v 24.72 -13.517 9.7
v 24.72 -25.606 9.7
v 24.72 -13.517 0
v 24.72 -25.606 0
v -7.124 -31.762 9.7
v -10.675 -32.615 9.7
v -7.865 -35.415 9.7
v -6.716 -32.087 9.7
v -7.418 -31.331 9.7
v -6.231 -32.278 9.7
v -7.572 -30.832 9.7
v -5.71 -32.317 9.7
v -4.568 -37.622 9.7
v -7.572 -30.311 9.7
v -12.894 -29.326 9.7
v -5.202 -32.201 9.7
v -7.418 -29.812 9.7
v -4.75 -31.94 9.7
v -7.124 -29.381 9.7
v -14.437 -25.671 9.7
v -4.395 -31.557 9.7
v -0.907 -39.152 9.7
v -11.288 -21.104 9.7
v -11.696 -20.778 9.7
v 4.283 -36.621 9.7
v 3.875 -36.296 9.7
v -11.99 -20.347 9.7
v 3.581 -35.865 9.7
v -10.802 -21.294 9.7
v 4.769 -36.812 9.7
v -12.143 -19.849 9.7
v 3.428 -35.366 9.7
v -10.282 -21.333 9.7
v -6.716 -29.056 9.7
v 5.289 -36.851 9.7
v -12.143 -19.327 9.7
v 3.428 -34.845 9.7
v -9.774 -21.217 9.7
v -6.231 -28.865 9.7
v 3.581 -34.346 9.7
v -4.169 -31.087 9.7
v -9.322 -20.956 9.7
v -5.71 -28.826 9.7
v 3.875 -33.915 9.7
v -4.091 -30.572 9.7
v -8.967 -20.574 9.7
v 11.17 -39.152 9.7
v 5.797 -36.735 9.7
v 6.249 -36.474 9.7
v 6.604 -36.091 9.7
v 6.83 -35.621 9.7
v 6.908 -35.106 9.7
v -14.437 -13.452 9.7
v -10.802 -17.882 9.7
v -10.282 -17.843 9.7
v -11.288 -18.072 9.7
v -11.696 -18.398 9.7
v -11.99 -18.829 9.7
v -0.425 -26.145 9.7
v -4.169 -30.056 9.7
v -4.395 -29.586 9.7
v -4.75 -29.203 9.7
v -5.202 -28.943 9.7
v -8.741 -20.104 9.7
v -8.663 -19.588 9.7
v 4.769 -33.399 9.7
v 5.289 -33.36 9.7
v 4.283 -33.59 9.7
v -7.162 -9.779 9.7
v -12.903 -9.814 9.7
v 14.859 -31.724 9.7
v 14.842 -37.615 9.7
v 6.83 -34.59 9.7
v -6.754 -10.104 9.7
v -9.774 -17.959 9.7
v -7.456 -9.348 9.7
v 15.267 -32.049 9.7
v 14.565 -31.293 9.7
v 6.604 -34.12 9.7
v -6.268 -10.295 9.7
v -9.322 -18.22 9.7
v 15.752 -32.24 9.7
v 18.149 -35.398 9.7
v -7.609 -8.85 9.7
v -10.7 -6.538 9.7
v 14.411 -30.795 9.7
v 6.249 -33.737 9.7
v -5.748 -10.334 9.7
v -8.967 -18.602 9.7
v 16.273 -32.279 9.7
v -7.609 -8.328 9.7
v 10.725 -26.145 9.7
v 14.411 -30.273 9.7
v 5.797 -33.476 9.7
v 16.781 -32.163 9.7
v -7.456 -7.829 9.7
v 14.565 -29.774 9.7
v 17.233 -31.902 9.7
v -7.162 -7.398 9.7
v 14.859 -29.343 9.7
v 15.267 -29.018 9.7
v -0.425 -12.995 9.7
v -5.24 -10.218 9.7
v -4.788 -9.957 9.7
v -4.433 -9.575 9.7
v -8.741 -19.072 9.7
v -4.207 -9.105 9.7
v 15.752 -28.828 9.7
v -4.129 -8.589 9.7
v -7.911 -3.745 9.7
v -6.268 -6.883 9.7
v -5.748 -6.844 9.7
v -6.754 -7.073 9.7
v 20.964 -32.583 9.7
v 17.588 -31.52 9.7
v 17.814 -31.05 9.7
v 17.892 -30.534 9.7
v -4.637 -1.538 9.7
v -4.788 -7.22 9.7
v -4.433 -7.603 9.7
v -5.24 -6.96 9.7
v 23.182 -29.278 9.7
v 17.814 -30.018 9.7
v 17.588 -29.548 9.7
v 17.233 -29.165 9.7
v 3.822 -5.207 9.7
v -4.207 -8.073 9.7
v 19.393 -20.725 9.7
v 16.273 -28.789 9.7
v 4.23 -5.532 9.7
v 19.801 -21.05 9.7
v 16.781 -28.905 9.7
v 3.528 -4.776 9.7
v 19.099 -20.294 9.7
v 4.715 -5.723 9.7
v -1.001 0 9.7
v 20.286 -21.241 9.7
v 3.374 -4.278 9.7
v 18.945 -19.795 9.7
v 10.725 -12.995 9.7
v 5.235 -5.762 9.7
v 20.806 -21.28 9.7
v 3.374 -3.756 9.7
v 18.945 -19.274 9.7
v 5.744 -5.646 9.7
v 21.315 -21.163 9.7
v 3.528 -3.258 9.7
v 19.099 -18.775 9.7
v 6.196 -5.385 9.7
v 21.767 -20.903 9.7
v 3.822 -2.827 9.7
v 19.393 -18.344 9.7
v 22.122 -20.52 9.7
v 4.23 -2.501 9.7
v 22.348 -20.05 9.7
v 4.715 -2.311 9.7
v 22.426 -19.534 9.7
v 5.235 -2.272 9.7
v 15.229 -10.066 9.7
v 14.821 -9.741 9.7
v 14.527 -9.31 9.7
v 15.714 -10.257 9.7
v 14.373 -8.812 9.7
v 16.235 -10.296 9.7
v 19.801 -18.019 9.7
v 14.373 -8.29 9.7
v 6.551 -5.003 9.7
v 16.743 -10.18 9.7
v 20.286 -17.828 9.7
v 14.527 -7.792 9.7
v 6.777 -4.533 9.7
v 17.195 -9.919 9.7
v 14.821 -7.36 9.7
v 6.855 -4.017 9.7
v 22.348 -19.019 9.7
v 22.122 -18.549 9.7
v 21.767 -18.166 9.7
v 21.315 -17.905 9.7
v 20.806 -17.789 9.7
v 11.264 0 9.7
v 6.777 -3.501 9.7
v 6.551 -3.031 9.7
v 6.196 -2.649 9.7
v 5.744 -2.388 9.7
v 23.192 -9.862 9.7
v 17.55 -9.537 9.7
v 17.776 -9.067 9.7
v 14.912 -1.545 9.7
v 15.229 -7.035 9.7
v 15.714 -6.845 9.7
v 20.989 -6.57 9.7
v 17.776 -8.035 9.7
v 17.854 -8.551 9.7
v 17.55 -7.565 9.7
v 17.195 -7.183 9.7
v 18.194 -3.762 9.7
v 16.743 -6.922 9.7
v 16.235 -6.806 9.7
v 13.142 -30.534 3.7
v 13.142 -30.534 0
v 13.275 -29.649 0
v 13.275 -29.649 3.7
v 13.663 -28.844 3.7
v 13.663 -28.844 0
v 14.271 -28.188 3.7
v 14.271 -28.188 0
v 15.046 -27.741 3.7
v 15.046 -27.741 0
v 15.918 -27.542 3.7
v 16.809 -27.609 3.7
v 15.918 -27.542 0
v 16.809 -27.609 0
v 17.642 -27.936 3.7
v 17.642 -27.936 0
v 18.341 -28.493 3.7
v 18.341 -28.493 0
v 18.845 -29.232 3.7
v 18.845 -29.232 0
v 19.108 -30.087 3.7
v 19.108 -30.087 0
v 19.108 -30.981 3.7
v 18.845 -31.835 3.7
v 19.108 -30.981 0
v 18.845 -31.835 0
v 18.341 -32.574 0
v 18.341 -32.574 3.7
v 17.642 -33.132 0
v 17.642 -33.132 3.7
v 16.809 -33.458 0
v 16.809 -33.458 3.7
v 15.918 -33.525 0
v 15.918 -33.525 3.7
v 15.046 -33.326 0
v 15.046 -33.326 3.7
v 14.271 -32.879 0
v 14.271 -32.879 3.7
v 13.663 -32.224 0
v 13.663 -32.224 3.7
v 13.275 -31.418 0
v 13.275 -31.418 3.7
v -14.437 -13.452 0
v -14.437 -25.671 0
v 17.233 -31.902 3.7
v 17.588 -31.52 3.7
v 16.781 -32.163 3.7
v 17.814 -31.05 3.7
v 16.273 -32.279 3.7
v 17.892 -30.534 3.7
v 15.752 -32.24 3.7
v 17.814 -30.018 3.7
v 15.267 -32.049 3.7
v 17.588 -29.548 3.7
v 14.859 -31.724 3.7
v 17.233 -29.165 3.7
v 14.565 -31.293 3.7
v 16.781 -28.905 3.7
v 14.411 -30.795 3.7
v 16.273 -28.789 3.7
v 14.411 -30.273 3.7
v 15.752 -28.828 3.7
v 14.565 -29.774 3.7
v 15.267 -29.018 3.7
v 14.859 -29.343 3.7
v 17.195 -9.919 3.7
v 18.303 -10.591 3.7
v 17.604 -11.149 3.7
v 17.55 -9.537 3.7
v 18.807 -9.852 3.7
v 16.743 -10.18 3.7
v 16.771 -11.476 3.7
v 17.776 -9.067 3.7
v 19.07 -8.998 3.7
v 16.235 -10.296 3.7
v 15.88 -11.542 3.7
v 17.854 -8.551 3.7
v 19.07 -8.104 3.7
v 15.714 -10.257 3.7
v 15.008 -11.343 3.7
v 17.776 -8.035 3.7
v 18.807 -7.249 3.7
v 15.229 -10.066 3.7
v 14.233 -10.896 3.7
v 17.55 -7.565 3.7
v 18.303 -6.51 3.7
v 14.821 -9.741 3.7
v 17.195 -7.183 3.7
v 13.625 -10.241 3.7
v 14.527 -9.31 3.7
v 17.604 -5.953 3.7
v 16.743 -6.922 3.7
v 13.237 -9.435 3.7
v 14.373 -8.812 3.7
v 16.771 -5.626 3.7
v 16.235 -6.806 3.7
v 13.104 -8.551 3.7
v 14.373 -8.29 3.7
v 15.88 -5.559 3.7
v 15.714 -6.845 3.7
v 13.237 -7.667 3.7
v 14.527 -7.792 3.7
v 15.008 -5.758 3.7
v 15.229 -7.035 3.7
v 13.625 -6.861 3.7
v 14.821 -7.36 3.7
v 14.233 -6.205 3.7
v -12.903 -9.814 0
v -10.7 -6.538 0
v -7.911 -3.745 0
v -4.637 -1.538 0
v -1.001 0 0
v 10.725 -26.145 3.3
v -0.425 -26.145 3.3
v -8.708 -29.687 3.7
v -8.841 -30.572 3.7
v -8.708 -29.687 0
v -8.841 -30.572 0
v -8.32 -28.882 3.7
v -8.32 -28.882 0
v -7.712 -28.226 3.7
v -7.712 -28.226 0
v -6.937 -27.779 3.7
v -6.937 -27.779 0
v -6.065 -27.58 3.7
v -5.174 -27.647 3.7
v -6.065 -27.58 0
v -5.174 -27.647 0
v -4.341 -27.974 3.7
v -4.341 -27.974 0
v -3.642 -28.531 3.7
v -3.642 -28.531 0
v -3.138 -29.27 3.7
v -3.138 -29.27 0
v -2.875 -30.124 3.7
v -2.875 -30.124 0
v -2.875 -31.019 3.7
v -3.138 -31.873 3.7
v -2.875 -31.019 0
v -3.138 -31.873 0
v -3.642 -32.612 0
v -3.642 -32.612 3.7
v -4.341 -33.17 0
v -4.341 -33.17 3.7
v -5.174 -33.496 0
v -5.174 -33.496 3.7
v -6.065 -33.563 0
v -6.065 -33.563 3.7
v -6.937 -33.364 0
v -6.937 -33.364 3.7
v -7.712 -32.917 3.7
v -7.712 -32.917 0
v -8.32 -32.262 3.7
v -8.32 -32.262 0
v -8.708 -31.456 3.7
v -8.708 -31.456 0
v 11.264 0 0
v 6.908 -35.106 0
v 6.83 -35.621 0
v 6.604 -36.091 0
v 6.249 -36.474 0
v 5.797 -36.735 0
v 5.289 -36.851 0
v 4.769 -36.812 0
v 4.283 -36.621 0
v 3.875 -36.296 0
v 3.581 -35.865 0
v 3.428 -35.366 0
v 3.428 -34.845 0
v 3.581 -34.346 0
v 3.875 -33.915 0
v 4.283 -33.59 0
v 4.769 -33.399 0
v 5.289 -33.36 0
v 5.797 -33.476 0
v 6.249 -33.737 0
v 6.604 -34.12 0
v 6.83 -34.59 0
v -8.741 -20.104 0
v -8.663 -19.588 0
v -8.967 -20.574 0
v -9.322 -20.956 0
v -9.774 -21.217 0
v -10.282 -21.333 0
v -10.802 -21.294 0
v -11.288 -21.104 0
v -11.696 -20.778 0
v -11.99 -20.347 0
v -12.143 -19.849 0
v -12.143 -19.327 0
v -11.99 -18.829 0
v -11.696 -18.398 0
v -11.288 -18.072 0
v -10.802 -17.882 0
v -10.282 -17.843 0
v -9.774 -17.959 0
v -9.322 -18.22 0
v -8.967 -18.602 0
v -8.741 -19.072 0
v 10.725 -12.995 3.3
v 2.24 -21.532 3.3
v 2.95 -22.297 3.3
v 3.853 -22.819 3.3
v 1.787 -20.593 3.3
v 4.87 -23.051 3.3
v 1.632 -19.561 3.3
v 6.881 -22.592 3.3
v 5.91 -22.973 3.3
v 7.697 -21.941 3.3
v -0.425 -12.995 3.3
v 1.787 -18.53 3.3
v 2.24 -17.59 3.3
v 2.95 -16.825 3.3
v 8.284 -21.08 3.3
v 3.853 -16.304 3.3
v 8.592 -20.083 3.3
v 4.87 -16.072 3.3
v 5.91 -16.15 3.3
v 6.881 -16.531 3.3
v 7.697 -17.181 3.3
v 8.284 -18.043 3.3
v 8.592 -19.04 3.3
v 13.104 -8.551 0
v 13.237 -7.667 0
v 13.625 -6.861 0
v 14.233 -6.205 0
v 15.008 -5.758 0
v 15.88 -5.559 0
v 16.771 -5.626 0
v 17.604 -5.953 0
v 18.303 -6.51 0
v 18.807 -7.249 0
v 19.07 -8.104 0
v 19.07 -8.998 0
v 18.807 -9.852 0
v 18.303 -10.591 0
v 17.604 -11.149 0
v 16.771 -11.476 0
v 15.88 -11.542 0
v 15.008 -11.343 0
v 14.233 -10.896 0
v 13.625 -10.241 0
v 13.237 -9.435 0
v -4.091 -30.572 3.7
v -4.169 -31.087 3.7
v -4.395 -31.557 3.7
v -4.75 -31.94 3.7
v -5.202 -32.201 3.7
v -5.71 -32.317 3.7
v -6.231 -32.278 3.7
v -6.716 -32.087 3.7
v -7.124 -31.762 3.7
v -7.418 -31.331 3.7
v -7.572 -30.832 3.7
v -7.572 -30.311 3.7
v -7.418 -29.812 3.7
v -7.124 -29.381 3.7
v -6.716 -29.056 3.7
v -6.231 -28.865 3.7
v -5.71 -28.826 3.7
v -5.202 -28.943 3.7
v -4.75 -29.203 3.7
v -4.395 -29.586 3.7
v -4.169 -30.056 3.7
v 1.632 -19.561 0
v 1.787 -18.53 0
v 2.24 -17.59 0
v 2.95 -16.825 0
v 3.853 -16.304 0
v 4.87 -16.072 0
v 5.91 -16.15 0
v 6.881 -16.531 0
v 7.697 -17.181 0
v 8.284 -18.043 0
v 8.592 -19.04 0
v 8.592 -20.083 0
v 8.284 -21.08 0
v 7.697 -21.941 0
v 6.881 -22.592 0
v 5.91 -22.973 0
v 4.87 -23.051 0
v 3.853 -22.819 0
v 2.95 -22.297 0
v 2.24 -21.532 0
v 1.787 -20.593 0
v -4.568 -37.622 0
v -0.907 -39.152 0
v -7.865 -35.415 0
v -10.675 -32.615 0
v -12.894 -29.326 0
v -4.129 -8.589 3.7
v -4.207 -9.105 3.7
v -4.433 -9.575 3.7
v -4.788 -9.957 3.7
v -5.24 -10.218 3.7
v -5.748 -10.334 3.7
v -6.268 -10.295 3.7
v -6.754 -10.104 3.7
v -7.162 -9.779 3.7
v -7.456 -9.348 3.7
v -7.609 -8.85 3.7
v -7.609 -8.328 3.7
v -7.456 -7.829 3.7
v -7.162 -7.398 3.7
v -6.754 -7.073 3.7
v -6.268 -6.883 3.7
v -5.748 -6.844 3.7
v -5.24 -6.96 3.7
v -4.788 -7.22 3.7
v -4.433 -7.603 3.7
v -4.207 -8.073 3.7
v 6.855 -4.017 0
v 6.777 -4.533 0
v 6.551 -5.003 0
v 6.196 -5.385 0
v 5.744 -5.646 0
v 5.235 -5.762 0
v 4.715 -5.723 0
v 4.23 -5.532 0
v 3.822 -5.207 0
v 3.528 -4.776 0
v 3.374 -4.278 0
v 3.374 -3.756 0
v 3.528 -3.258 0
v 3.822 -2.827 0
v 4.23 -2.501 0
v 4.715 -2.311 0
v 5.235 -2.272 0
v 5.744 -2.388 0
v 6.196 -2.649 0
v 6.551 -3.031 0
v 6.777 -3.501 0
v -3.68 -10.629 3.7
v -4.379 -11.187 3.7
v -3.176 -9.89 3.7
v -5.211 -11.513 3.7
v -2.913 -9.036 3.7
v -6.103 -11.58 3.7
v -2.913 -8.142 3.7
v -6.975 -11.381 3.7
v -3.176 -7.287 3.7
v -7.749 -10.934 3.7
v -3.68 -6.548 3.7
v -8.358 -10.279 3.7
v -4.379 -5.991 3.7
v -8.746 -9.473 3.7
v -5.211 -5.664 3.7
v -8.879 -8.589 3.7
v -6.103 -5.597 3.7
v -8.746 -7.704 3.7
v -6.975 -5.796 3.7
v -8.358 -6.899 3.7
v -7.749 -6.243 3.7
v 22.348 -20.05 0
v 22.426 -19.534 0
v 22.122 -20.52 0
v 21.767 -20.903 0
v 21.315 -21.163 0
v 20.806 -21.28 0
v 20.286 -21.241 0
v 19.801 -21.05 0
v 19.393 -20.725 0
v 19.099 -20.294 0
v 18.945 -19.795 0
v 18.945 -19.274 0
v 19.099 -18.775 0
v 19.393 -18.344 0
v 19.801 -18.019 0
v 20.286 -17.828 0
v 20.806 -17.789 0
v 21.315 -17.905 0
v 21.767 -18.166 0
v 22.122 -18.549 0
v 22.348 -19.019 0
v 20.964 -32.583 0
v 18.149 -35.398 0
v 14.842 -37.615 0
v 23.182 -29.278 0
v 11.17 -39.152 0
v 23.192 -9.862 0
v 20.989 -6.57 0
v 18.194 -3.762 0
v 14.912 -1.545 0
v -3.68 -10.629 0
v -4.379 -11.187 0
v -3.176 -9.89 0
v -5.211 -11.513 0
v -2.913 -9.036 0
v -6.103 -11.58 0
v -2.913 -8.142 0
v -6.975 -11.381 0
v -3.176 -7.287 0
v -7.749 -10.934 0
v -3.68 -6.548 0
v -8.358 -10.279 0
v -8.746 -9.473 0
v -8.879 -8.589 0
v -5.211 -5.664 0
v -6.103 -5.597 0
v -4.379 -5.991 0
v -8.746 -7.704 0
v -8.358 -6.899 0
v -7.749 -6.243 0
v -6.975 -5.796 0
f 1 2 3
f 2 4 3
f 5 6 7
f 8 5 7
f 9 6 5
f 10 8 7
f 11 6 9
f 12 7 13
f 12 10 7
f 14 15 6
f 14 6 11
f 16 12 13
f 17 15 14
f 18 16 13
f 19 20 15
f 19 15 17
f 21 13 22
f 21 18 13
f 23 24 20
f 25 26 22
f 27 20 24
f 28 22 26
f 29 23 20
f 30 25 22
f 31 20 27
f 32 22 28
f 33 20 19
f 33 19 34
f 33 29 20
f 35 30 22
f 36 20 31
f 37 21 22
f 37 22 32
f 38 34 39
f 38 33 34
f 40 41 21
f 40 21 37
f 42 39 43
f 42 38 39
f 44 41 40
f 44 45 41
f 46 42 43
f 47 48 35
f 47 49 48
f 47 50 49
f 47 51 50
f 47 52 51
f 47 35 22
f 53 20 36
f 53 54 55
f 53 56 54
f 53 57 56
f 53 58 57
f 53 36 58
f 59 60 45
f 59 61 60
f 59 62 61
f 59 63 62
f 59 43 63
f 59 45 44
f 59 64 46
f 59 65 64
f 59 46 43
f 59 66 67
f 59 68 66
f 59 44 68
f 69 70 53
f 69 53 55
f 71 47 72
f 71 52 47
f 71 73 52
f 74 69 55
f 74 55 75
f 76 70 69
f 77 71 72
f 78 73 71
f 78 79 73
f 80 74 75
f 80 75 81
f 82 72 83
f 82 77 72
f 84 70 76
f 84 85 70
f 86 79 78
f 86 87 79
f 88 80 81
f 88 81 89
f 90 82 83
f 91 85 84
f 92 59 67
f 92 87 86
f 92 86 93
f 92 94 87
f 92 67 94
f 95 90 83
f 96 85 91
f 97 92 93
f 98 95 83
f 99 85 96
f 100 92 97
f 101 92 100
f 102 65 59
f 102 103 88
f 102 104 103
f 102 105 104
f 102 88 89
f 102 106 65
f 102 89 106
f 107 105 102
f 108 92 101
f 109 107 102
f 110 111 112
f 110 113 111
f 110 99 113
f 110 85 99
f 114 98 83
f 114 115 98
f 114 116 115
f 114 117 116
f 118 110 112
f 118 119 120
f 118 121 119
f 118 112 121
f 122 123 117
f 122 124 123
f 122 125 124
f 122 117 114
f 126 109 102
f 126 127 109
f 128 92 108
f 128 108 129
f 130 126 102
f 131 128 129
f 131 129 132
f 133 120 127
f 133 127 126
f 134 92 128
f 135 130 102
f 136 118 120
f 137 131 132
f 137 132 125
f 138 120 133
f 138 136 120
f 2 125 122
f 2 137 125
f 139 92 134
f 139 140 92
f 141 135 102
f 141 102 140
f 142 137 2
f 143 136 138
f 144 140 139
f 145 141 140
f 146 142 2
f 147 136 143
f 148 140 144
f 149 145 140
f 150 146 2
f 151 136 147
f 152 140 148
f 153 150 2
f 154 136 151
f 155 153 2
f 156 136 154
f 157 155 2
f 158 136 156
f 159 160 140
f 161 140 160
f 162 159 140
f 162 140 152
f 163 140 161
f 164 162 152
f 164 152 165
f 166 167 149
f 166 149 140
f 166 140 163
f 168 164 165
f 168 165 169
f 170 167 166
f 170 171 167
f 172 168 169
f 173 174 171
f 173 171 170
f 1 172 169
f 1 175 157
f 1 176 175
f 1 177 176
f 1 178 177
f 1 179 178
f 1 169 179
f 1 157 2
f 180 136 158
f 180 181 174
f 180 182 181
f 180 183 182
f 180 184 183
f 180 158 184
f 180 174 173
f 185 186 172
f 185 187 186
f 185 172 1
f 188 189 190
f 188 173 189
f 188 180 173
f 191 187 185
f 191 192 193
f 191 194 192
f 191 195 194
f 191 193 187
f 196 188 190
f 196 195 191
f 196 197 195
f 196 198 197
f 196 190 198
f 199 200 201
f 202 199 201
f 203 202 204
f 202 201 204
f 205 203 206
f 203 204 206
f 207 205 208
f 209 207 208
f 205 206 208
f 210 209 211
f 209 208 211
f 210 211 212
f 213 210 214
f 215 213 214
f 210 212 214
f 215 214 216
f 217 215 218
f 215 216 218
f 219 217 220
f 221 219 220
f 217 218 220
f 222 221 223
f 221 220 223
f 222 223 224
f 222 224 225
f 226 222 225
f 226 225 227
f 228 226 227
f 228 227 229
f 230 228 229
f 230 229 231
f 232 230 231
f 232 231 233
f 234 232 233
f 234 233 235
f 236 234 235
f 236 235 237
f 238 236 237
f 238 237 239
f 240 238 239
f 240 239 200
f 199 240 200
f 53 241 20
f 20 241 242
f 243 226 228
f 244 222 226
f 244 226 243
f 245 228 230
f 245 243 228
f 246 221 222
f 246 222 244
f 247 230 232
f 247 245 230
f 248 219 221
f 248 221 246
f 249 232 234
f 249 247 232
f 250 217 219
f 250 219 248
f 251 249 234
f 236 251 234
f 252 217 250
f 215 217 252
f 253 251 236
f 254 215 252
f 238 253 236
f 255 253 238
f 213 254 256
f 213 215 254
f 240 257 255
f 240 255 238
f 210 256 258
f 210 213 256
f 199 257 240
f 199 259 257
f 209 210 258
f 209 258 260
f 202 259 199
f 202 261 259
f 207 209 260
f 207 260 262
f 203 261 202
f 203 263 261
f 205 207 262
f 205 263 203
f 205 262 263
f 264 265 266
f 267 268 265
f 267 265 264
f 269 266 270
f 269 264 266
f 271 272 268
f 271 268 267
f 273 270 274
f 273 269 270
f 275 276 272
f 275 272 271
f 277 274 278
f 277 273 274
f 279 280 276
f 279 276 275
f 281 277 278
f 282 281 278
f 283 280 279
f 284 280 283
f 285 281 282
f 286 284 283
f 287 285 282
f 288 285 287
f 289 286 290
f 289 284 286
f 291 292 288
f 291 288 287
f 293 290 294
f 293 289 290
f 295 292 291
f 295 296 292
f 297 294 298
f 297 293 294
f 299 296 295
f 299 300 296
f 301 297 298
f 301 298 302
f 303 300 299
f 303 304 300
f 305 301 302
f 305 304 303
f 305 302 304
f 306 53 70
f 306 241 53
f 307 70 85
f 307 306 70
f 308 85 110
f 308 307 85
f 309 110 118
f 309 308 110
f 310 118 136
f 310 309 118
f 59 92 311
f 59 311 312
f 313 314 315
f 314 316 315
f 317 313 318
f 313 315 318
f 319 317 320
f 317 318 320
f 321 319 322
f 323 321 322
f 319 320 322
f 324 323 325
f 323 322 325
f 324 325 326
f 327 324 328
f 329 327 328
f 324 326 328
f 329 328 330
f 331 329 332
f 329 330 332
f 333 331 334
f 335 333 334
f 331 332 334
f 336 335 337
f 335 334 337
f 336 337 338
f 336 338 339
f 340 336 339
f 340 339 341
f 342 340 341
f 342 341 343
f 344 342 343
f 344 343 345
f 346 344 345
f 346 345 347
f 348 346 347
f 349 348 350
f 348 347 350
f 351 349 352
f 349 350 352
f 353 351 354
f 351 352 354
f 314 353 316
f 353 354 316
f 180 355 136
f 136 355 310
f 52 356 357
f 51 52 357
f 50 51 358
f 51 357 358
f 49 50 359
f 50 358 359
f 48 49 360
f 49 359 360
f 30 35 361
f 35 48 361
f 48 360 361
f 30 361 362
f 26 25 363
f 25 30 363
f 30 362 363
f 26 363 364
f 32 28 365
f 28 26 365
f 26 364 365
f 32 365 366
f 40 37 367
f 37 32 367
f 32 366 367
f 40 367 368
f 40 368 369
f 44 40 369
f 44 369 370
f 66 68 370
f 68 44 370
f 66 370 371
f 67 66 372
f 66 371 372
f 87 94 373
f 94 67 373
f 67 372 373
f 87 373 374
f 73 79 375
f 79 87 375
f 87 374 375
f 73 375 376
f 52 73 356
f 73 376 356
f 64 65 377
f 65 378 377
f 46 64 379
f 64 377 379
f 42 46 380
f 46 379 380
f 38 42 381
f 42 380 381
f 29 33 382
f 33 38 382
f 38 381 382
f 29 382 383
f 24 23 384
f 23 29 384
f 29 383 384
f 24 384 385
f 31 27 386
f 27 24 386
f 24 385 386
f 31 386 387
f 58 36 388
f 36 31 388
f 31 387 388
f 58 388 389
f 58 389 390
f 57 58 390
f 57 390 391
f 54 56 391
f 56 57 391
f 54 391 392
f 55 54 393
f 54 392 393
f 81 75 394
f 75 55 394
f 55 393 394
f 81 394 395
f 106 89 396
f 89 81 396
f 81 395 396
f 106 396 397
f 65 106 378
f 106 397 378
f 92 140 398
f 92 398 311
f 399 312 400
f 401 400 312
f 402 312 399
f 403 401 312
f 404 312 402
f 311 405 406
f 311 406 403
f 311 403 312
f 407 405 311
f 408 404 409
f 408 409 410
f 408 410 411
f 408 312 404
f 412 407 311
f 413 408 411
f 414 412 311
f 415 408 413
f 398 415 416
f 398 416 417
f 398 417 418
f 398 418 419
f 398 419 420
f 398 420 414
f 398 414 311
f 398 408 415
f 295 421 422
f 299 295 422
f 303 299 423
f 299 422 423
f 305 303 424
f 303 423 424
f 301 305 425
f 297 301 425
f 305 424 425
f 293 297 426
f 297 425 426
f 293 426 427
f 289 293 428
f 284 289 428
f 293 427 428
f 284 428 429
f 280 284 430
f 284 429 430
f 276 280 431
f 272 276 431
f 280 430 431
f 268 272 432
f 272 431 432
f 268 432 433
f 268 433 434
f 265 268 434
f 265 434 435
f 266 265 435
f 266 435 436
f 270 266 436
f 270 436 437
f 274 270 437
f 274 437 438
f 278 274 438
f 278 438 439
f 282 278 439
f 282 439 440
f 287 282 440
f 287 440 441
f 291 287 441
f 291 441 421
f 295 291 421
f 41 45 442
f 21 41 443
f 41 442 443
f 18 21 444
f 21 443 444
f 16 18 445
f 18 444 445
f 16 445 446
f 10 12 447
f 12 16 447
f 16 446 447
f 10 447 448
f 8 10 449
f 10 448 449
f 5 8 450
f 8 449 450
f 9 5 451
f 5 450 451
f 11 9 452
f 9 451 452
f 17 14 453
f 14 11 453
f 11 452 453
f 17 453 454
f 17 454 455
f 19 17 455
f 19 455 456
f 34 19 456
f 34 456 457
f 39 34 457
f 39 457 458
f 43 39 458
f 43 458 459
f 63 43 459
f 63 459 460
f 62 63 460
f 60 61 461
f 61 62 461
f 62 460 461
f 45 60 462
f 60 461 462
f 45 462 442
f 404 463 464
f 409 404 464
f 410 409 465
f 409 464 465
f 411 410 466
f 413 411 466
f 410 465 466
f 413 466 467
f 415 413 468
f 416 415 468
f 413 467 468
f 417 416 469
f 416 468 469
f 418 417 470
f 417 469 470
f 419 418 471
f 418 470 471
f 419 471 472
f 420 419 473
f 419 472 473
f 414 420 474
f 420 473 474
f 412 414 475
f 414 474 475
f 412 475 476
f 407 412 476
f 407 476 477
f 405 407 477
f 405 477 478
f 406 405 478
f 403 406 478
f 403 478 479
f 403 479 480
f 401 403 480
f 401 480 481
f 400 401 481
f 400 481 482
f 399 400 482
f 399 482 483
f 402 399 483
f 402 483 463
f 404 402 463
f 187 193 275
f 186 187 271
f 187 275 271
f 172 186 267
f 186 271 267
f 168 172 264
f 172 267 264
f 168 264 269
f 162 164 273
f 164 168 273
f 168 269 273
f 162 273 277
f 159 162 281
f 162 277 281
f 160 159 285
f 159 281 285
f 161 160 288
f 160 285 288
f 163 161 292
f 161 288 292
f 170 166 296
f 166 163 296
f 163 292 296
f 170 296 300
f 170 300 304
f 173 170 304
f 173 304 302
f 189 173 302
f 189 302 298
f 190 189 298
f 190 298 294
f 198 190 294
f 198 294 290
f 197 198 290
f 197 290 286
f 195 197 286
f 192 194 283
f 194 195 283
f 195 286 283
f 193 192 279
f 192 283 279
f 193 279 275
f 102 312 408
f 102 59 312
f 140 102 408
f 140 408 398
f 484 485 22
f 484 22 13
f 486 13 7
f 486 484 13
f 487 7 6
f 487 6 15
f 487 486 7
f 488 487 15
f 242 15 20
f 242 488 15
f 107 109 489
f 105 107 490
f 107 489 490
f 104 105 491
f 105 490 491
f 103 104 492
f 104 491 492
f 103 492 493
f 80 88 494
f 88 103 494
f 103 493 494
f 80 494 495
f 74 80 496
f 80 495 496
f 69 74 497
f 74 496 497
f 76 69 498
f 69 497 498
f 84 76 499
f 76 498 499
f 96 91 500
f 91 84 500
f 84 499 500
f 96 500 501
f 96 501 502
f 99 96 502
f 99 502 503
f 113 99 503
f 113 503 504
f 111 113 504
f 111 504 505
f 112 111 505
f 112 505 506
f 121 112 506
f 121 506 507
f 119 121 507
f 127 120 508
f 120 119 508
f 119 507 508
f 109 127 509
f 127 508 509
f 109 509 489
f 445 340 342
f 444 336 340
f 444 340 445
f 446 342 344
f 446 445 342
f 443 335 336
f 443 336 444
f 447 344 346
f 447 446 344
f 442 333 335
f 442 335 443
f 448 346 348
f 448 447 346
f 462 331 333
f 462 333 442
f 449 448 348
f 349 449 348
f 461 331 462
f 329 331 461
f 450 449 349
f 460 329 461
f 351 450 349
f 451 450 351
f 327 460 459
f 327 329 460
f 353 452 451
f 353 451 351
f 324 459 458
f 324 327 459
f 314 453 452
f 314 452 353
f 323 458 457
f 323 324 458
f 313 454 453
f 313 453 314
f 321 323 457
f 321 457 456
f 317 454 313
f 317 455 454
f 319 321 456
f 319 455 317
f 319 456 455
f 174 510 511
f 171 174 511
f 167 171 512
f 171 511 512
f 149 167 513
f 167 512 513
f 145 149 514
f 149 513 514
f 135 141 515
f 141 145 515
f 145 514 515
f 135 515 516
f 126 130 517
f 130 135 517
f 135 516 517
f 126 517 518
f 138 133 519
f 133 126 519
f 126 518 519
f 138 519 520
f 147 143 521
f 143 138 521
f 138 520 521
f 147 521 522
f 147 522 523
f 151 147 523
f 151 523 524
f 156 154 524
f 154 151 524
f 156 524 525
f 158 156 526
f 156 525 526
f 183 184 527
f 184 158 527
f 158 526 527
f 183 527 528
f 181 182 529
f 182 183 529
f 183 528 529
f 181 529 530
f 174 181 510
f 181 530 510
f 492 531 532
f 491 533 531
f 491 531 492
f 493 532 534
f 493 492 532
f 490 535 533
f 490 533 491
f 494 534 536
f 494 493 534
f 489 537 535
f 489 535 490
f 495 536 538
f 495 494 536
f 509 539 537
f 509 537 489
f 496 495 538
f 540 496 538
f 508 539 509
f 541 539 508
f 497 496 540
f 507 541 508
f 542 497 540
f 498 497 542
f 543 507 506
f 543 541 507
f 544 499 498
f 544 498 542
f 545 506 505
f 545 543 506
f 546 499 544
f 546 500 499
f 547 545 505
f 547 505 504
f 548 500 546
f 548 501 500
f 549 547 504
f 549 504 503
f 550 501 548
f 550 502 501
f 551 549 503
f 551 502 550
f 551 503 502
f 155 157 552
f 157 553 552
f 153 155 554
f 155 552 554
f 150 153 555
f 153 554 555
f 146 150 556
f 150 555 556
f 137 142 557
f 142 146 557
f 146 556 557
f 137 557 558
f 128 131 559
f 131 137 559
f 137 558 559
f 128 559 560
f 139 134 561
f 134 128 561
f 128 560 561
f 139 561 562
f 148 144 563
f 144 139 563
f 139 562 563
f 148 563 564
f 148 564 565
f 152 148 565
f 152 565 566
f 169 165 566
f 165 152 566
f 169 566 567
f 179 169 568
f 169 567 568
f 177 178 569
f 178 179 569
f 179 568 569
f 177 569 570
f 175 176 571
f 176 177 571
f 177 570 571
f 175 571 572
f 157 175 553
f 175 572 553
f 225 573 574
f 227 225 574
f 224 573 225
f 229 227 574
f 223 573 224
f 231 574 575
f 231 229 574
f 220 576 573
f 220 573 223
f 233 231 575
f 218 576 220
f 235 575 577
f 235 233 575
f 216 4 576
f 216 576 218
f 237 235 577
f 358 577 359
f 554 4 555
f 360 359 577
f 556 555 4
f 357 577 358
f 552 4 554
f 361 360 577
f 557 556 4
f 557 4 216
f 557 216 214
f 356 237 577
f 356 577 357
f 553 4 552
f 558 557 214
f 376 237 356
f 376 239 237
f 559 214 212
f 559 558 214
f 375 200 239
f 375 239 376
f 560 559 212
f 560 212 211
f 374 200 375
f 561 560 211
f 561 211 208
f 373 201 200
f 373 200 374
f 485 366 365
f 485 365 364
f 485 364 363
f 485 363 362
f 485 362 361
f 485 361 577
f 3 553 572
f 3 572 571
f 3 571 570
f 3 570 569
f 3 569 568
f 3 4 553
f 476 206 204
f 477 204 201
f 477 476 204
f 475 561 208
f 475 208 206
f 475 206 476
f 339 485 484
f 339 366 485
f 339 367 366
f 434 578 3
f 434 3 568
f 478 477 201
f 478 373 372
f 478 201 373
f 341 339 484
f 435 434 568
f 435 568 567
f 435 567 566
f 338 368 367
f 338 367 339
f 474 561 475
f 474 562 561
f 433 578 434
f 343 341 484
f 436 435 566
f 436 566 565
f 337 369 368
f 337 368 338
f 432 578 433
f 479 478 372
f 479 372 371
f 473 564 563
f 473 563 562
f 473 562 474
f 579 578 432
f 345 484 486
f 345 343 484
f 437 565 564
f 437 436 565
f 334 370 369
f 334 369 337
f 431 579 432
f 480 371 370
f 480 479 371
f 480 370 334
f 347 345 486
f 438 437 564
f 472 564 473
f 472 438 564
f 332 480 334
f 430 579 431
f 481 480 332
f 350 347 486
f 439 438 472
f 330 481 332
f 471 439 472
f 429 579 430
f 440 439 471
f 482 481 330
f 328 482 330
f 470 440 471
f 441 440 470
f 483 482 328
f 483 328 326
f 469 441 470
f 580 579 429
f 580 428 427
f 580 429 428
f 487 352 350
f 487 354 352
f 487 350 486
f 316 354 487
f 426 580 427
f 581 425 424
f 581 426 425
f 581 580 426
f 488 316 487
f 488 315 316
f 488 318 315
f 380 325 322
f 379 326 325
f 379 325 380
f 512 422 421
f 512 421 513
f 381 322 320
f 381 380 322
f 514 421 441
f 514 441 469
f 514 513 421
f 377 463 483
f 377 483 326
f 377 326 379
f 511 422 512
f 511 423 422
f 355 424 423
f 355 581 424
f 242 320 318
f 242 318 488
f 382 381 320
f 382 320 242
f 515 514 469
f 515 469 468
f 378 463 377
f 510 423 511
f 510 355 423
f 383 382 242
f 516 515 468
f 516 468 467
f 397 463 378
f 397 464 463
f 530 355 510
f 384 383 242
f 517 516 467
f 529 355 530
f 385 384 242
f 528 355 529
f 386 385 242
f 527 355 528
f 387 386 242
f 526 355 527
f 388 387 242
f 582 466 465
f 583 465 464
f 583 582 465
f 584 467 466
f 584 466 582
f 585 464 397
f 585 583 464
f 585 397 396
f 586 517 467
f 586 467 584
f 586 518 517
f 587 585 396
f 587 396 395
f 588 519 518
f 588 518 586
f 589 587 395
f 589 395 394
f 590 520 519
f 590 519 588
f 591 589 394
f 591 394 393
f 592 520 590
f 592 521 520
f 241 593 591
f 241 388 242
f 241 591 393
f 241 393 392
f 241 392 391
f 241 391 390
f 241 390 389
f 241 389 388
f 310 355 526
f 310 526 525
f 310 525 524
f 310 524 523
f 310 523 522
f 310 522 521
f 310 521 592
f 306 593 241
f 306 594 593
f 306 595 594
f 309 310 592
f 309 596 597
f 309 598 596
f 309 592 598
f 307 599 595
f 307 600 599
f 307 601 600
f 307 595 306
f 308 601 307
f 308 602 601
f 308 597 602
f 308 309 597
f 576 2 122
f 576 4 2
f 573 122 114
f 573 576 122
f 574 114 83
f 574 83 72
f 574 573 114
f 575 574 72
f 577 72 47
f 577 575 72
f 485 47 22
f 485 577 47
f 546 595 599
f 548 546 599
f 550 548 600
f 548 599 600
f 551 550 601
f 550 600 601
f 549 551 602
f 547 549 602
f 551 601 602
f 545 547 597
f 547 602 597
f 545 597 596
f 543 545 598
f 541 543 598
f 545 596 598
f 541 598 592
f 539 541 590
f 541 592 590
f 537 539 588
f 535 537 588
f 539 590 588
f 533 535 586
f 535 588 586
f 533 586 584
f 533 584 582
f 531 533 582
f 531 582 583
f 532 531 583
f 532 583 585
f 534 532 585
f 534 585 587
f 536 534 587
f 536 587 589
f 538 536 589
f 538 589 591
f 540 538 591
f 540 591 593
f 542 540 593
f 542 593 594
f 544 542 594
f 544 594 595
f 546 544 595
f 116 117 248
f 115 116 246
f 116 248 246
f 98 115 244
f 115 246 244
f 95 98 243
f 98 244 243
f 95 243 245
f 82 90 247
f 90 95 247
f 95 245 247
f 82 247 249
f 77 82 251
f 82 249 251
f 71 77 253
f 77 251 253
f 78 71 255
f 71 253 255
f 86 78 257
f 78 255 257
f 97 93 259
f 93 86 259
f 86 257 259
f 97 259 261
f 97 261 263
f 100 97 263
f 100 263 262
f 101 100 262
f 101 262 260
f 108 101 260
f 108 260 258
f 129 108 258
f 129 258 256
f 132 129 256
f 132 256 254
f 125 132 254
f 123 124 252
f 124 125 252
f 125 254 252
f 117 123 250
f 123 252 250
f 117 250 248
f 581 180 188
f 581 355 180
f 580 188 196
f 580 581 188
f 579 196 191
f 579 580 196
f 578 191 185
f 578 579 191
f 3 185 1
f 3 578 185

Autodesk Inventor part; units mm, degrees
ref_plane "YZ Plane" through (0, 0, 0) normal (1, 0, 0) x (0, 1, 0)
ref_plane "XZ Plane" through (0, 0, 0) normal (0, 1, 0) x (-1, 0, 0)
ref_plane "XY Plane" through (0, 0, 0) normal (0, 0, 1) x (1, 0, 0)
sketch "Szkic1" plane through (0, 0, 0) normal (0, 0, 1) x (1, 0, 0)
  line L0 (24.72, -24.72) -> (24.72, -14.42)
  line L1 (25.2197, -24.72) -> (24.72, -24.72)
  line L2 (24.72, -14.42) -> (25.2197, -14.42)
  line L3 (0, -39.14) -> (10.3, -39.14)
  line L4 (-14.42, -14.42) -> (-14.42, -24.72)
  line L5 (10.3, 0) -> (0, 0)
  line L6 (10.225, -25.645) -> (10.225, -13.495)
  line L7 (10.225, -25.645) -> (0.075, -25.645)
  line L8 (0.075, -13.495) -> (0.075, -25.645)
  line L9 (0.075, -13.495) -> (10.225, -13.495)
  line L10 (-14.9619, -24.72) -> (-14.9619, -24.7024)
  arc A0 (-14.9619, -24.7024) -> (0.075, -39.676) centre (5.1314, -19.5612) ccw
  arc A1 (10.3, -39.6475) -> (25.2201, -24.72) centre (5.1314, -19.5612) ccw
  line L11 (-14.9619, -14.42) -> (-14.42, -14.42)
  line L12 (24.72, -14.42) -> (25.2247, -14.42)
  line L13 (-14.42, -24.72) -> (-14.9619, -24.72)
  line L14 (0.075, -39.14) -> (0.075, -39.676)
  line L15 (0.075, 0.5536) -> (0.075, 0)
  line L16 (0.075, -13.495) -> (0.075, -25.645)
  line L17 (10.3, -39.6475) -> (10.3, -39.14)
  line L18 (10.3, 0) -> (10.3, 0.5251)
  line L19 (25.2201, -24.72) -> (24.72, -24.72)
  arc A2 (25.2247, -14.42) -> (10.3, 0.5251) centre (5.1314, -19.5612) ccw
  arc A3 (0.075, 0.5536) -> (-14.9619, -14.42) centre (5.1314, -19.5612) ccw
  circle A4 centre (5.1581, -35.1055) radius 1.75
  circle A5 centre (16.1418, -30.5337) radius 1.75
  circle A6 centre (20.6757, -19.5344) radius 1.75
  circle A7 centre (16.1039, -8.5508) radius 1.75
  circle A8 centre (5.1046, -4.0169) radius 1.75
  circle A9 centre (-5.879, -8.5887) radius 1.75
  circle A10 centre (-10.4129, -19.588) radius 1.75
  circle A11 centre (-5.8412, -30.5716) radius 1.75
  point P0 (5.15, -19.57)
  point P1 (-14.9574, -24.72)
  dimension "d0" = 3.5
  dimension "d3" = 360
extrude "Wyciągnięcie proste1" add sketch "Szkic1" along normal blind 9.7 contours L1 A1 L17 L3 L14 A0 L13 L4 L11 A3 L15 L5 L18 A2 L12 L2 L0
sketch "Szkic2" plane through (0, 0, 0) normal (0, 0, -1) x (-1, 0, 0)
  circle A0 centre (-16.1039, -8.5508) radius 1.75 projected
  circle A1 centre (-16.1039, -8.5508) radius 3
  arc A2 (-10.3, 0.5251) -> (-25.2247, -14.42) centre (-5.1314, -19.5612) ccw projected
  arc A3 (-0.075, -39.676) -> (14.9574, -24.72) centre (-5.1314, -19.5612) ccw projected
  circle A4 centre (-16.1418, -30.5337) radius 3
  circle A5 centre (5.8412, -30.5716) radius 3
  circle A6 centre (5.879, -8.5887) radius 3
  point P0 (0, 0)
  dimension "d7" = 6
  dimension "d10" = 360
extrude "Wyciągnięcie proste2" cut sketch "Szkic2" against normal blind 3.7
sketch "Szkic3" plane through (0, 0, 0) normal (0, 0, -1) x (-1, 0, 0)
  circle A0 centre (5.8412, -30.5716) radius 3 projected
  circle A1 centre (5.879, -8.5887) radius 3 projected
  circle A2 centre (-16.1418, -30.5337) radius 3 projected
  circle A3 centre (-16.1039, -8.5508) radius 3 projected
  line L0 (-24.72, -14.42) -> (-25.2247, -14.42) projected
  line L1 (-24.72, -24.72) -> (-24.72, -14.42) projected
  line L2 (-25.2201, -24.72) -> (-24.72, -24.72) projected
  arc A4 (-25.2201, -24.72) -> (-10.3, -39.6475) centre (-5.1314, -19.5612) ccw projected
  line L3 (-10.3, -39.14) -> (-10.3, -39.6475) projected
  line L4 (-0.075, -39.14) -> (-10.3, -39.14) projected
  line L5 (-0.075, -39.676) -> (-0.075, -39.14) projected
  arc A5 (-0.075, -39.676) -> (14.9574, -24.72) centre (-5.1314, -19.5612) ccw projected
  line L6 (14.42, -24.72) -> (14.9574, -24.72) projected
  line L7 (14.42, -14.42) -> (14.42, -24.72) projected
  line L8 (14.9619, -14.42) -> (14.42, -14.42) projected
  arc A6 (14.9619, -14.42) -> (-0.075, 0.5536) centre (-5.1314, -19.5612) ccw projected
  line L9 (-0.075, 0) -> (-0.075, 0.5536) projected
  line L10 (-10.3, 0) -> (-0.075, 0) projected
  line L11 (-10.3, 0.5251) -> (-10.3, 0) projected
  arc A7 (-10.3, 0.5251) -> (-25.2247, -14.42) centre (-5.1314, -19.5612) ccw projected
  circle A8 centre (10.4129, -19.588) radius 1.75 projected
  circle A9 centre (-5.1581, -35.1055) radius 1.75 projected
  circle A10 centre (-20.6757, -19.5344) radius 1.75 projected
  circle A11 centre (-5.1046, -4.0169) radius 1.75 projected
  line L12 (-10.225, -25.645) -> (-0.075, -25.645) projected
  line L13 (-10.225, -13.495) -> (-10.225, -25.645) projected
  line L14 (-0.075, -13.495) -> (-10.225, -13.495) projected
  line L15 (-0.075, -25.645) -> (-0.075, -13.495) projected
  line L16 (-10.225, -13.495) -> (-8.225, -13.495)
  line L17 (-8.225, -13.495) -> (-8.225, -25.645)
  line L18 (-8.225, -25.645) -> (-10.225, -25.645)
  line L19 (-10.225, -25.645) -> (-10.225, -13.495)
  line L20 (-0.075, -25.645) -> (-2.075, -25.645)
  line L21 (-2.075, -25.645) -> (-2.075, -13.495)
  line L22 (-2.075, -13.495) -> (-0.075, -13.495)
  line L23 (-0.075, -13.495) -> (-0.075, -25.645)
  point P0 (0, 0)
  dimension "d14" = 2
  dimension "d15" = 2
extrude "Wyciągnięcie proste3" add sketch "Szkic3" against normal blind 4.7 contours L13 L14 L17 L12 | L21 L14 L15 L12
sketch "Szkic4" plane through (0, 0, 9.7) normal (0, 0, 1) x (1, 0, 0)
  line L0 (24.72, -14.42) -> (25.2247, -14.42) projected
  arc A0 (25.2247, -14.42) -> (10.3, 0.5251) centre (5.1314, -19.5612) ccw projected
  line L1 (10.3, 0.5251) -> (10.3, 0) projected
  line L2 (10.3, 0) -> (0.075, 0) projected
  line L3 (0.075, 0) -> (0.075, 0.5536) projected
  arc A1 (0.075, 0.5536) -> (-14.9619, -14.42) centre (5.1314, -19.5612) ccw projected
  line L4 (-14.9619, -14.42) -> (-14.42, -14.42) projected
  line L5 (-14.42, -14.42) -> (-14.42, -24.72) projected
  line L6 (-14.42, -24.72) -> (-14.9574, -24.72) projected
  arc A2 (-14.9574, -24.72) -> (0.075, -39.676) centre (5.1314, -19.5612) ccw projected
  line L7 (0.075, -39.676) -> (0.075, -39.14) projected
  line L8 (0.075, -39.14) -> (10.3, -39.14) projected
  line L9 (10.3, -39.14) -> (10.3, -39.6475) projected
  arc A3 (10.3, -39.6475) -> (25.2201, -24.72) centre (5.1314, -19.5612) ccw projected
  line L10 (25.2201, -24.72) -> (24.72, -24.72) projected
  line L11 (24.72, -24.72) -> (24.72, -14.42) projected
  circle A4 centre (-10.4129, -19.588) radius 1.75 projected
  circle A5 centre (5.1581, -35.1055) radius 1.75 projected
  circle A6 centre (20.6757, -19.5344) radius 1.75 projected
  circle A7 centre (5.1046, -4.0169) radius 1.75 projected
  circle A8 centre (-5.8412, -30.5716) radius 1.75 projected
  circle A9 centre (-5.879, -8.5887) radius 1.75 projected
  circle A10 centre (16.1039, -8.5508) radius 1.75 projected
  circle A11 centre (16.1418, -30.5337) radius 1.75 projected
  line L12 (10.225, -25.645) -> (0.075, -25.645) projected
  line L13 (0.075, -25.645) -> (0.075, -13.495) projected
  line L14 (0.075, -13.495) -> (10.225, -13.495) projected
  line L15 (10.225, -13.495) -> (10.225, -25.645) projected
  line L16 (10.3, 0.5251) -> (10.3, 0) projected
  line L17 (10.3, 0.5251) -> (0.075, 0.5536)
  line L18 (10.3, 0) -> (0.075, 0) projected
  circle A12 centre (5.1314, -19.5612) radius 20.2325
  point P0 (0, 0)
  point P1 (-14.4371, -14.42)
  point P2 (0.075, 0.0293)
  point P3 (0.075, -39.1517)
  point P4 (-14.4324, -24.72)
  point P5 (24.72, -24.6249)
  point P6 (10.2329, -39.14)
  point P7 (24.72, -14.4975)
extrude "Wyciągnięcie proste4" cut sketch "Szkic4" against normal through all contours L11 A12 L1 A0 L0 | L11 L10 A3 L9 L8 A12 | L7 A2 L6 A12 | A12 L4 A1 L3
sketch "Szkic5" plane through (0, 0, 0) normal (0, 0, -1) x (-1, 0, 0)
  line L0 (-10.225, -13.495) -> (-10.225, -25.645) projected
  line L1 (-8.225, -13.495) -> (-10.225, -13.495) projected
  line L2 (-2.075, -13.495) -> (-8.225, -13.495) projected
  line L3 (-0.075, -13.495) -> (-2.075, -13.495) projected
  line L4 (-0.075, -25.645) -> (-0.075, -13.495) projected
  line L5 (-2.075, -25.645) -> (-0.075, -25.645) projected
  line L6 (-8.225, -25.645) -> (-2.075, -25.645) projected
  line L7 (-10.225, -25.645) -> (-8.225, -25.645) projected
  line L8 (-10.2317, -25.6607) -> (-10.2317, -13.4607)
  line L9 (-0.0317, -13.4607) -> (-10.2317, -13.4607)
  circle A0 centre (-5.1314, -15.0608) radius 0.8097
  line L10 (-0.0317, -25.6607) -> (-0.0317, -13.4607)
  line L11 (-10.2317, -25.6607) -> (-0.0317, -25.6607)
  circle A1 centre (-5.1314, -19.5612) radius 3.4994
  circle A2 centre (-5.1314, -24.061) radius 0.8096
  arc A3 (-10.3, 0) -> (-24.72, -14.4975) centre (-5.1314, -19.5612) ccw projected
  point P0 (0, 0)
  point P1 (-5.1317, -19.5607)
extrude "Wyciągnięcie proste5" cut sketch "Szkic5" against normal through all contours L1 L2 L3 L4 L5 L6 L7 L0 | A1
extrude "Wyciągnięcie proste6" add sketch "Szkic5" against normal blind 7.3 contours L1 L2 L3 L4 L5 L6 L7 L0
sketch "Szkic6" plane through (0, 0, 0) normal (0, 0, -1) x (-1, 0, 0)
  arc A0 (-10.3, 0) -> (-24.72, -14.4975) centre (-5.1314, -19.5612) ccw projected
  circle A1 centre (-5.1314, -19.5612) radius 3.4994 projected
  circle A2 centre (-5.1314, -19.5612) radius 20.5
  circle A3 centre (-5.1314, -24.061) radius 0.8096 projected
  circle A4 centre (-5.1314, -19.5612) radius 3.4994 projected
  circle A5 centre (-5.1314, -15.0608) radius 0.8097 projected
  circle A6 centre (-5.1046, -4.0169) radius 1.75 projected
  circle A7 centre (-20.6757, -19.5344) radius 1.75 projected
  circle A8 centre (-5.1581, -35.1055) radius 1.75 projected
  circle A9 centre (10.4129, -19.588) radius 1.75 projected
  circle A10 centre (-16.1039, -8.5508) radius 3 projected
  circle A11 centre (-16.1418, -30.5337) radius 3 projected
  circle A12 centre (5.879, -8.5887) radius 3 projected
  circle A13 centre (5.8412, -30.5716) radius 3 projected
  arc A14 (-0.075, -39.1517) -> (14.4324, -24.72) centre (-5.1314, -19.5612) ccw projected
  line L0 (14.42, -24.72) -> (14.4324, -24.72) projected
  line L1 (14.42, -14.42) -> (14.42, -24.72) projected
  line L2 (14.4371, -14.42) -> (14.42, -14.42) projected
  arc A15 (14.4371, -14.42) -> (-0.075, 0.0293) centre (-5.1314, -19.5612) ccw projected
  line L3 (-0.075, 0) -> (-0.075, 0.0293) projected
  line L4 (-10.3, 0) -> (-0.075, 0) projected
  arc A16 (-10.3, 0) -> (-24.72, -14.4975) centre (-5.1314, -19.5612) ccw projected
  line L5 (-24.72, -24.6249) -> (-24.72, -14.4975) projected
  arc A17 (-24.72, -24.6249) -> (-10.2329, -39.14) centre (-5.1314, -19.5612) ccw projected
  line L6 (-0.075, -39.14) -> (-10.2329, -39.14) projected
  line L7 (-0.075, -39.1517) -> (-0.075, -39.14) projected
  line L8 (-24.72, -6.5254) -> (-24.72, -33.3555)
  line L9 (14.4371, -5.2931) -> (14.4371, -36.8555)
  line L10 (-20.6757, -39.1517) -> (13.3882, -39.1517)
  line L11 (-24, 0) -> (14, 0)
  point P0 (0, 0)
  point P1 (-24.72, -25.6056)
  point P2 (-11.1697, -39.1517)
  point P3 (-0.075, -39.1517)
  point P4 (-0.075, -39.1517)
  point P5 (0.907, -39.1517)
  point P6 (14.4371, -25.6707)
  point P7 (1.0013, 0)
  point P8 (0.0373, 0)
  point P9 (14.4371, -13.4517)
  point P10 (-11.264, 0)
  point P11 (-24.72, -13.5168)
  dimension "d24" = 41
extrude "Wyciągnięcie proste7" add sketch "Szkic6" against normal up to surface (9.7 mm away) contours A0 L8 A2 L11 | A17 L6 L7 L10 A2 L8 | L11 A2 L9 A15 | L9 A2 L10 A14 L0 L1 L2
sketch "Szkic7" plane through (0, 0, 9.7) normal (0, 0, 1) x (1, 0, 0)
  line L0 (10.225, -25.645) -> (0.075, -25.645) projected
  line L1 (0.075, -25.645) -> (0.075, -13.495) projected
  line L2 (0.075, -13.495) -> (10.225, -13.495) projected
  line L3 (10.225, -13.495) -> (10.225, -25.645) projected
  circle A0 centre (16.1418, -30.5337) radius 1.75 projected
  circle A1 centre (16.1039, -8.5508) radius 1.75 projected
  circle A2 centre (-5.879, -8.5887) radius 1.75 projected
  circle A3 centre (-5.8412, -30.5716) radius 1.75 projected
  circle A4 centre (5.1046, -4.0169) radius 1.75 projected
  circle A5 centre (20.6757, -19.5344) radius 1.75 projected
  circle A6 centre (5.1581, -35.1055) radius 1.75 projected
  circle A7 centre (-10.4129, -19.588) radius 1.75 projected
  line L4 (24.72, -13.5168) -> (24.72, -25.6056) projected
  arc A8 (24.72, -13.5168) -> (11.264, 0) centre (5.1314, -19.5612) ccw projected
  line L5 (0.075, 0) -> (11.264, 0) projected
  line L6 (0.075, 0) -> (0.075, 0.0293) projected
  arc A9 (0.075, 0.0293) -> (-0.0373, 0) centre (5.1314, -19.5612) ccw projected
  line L7 (-1.0013, 0) -> (-0.0373, 0) projected
  arc A10 (-1.0013, 0) -> (-14.4371, -13.4517) centre (5.1314, -19.5612) ccw projected
  line L8 (-14.4371, -25.6707) -> (-14.4371, -13.4517) projected
  arc A11 (-14.4371, -25.6707) -> (-0.907, -39.1517) centre (5.1314, -19.5612) ccw projected
  line L9 (11.1697, -39.1517) -> (-0.907, -39.1517) projected
  arc A12 (11.1697, -39.1517) -> (24.72, -25.6056) centre (5.1314, -19.5612) ccw projected
  line L10 (0.075, 0) -> (-0.0373, 0)
  point P0 (0, 0)
extrude "Wyciągnięcie proste8" cut sketch "Szkic7" against normal through all contours L10 A9 L6
sketch "Szkic8" plane through (0, 0, 7.3) normal (0, 0, 1) x (1, 0, 0)
  line L0 (10.225, -25.645) -> (0.075, -25.645) projected
  line L1 (10.225, -13.495) -> (10.225, -25.645) projected
  line L2 (0.075, -13.495) -> (10.225, -13.495) projected
  line L3 (0.075, -25.645) -> (0.075, -13.495) projected
  circle A0 centre (5.1314, -15.0608) radius 0.8097 projected
  circle A1 centre (5.1314, -19.5612) radius 3.4994 projected
  circle A2 centre (5.1314, -24.061) radius 0.8096 projected
  point P0 (0, 0)
extrude "Wyciągnięcie proste9" cut sketch "Szkic8" against normal blind 4
sketch "Szkic9" plane through (0, 0, 0) normal (0, 0, -1) x (-1, 0, 0)
  circle A0 centre (-5.1314, -15.0608) radius 0.8097 projected
  circle A1 centre (-5.1314, -24.061) radius 0.8096 projected
  point P0 (0, 0)
extrude "Wyciągnięcie proste10" add sketch "Szkic9" against normal up to surface (3.3 mm away)
sketch "Szkic10" plane through (0, 0, 9.7) normal (0, 0, 1) x (1, 0, 0)
  line L0 (0.075, -25.645) -> (0.075, -13.495) projected
  line L1 (10.225, -25.645) -> (0.075, -25.645) projected
  line L2 (10.225, -13.495) -> (10.225, -25.645) projected
  line L3 (0.075, -13.495) -> (10.225, -13.495) projected
  line L4 (10.725, -26.145) -> (-0.425, -26.145)
  line L5 (-0.425, -26.145) -> (-0.425, -12.995)
  line L6 (-0.425, -12.995) -> (10.725, -12.995)
  line L7 (10.725, -12.995) -> (10.725, -26.145)
  point P0 (0, 0)
  dimension "d33" = 0.5
extrude "Wyciągnięcie proste11" cut sketch "Szkic10" against normal up to surface (6.4 mm away) contours L0 L3 L2 L1 | L4 L5 L6 L7
properties part number "GripperBaseCircularUpper"
